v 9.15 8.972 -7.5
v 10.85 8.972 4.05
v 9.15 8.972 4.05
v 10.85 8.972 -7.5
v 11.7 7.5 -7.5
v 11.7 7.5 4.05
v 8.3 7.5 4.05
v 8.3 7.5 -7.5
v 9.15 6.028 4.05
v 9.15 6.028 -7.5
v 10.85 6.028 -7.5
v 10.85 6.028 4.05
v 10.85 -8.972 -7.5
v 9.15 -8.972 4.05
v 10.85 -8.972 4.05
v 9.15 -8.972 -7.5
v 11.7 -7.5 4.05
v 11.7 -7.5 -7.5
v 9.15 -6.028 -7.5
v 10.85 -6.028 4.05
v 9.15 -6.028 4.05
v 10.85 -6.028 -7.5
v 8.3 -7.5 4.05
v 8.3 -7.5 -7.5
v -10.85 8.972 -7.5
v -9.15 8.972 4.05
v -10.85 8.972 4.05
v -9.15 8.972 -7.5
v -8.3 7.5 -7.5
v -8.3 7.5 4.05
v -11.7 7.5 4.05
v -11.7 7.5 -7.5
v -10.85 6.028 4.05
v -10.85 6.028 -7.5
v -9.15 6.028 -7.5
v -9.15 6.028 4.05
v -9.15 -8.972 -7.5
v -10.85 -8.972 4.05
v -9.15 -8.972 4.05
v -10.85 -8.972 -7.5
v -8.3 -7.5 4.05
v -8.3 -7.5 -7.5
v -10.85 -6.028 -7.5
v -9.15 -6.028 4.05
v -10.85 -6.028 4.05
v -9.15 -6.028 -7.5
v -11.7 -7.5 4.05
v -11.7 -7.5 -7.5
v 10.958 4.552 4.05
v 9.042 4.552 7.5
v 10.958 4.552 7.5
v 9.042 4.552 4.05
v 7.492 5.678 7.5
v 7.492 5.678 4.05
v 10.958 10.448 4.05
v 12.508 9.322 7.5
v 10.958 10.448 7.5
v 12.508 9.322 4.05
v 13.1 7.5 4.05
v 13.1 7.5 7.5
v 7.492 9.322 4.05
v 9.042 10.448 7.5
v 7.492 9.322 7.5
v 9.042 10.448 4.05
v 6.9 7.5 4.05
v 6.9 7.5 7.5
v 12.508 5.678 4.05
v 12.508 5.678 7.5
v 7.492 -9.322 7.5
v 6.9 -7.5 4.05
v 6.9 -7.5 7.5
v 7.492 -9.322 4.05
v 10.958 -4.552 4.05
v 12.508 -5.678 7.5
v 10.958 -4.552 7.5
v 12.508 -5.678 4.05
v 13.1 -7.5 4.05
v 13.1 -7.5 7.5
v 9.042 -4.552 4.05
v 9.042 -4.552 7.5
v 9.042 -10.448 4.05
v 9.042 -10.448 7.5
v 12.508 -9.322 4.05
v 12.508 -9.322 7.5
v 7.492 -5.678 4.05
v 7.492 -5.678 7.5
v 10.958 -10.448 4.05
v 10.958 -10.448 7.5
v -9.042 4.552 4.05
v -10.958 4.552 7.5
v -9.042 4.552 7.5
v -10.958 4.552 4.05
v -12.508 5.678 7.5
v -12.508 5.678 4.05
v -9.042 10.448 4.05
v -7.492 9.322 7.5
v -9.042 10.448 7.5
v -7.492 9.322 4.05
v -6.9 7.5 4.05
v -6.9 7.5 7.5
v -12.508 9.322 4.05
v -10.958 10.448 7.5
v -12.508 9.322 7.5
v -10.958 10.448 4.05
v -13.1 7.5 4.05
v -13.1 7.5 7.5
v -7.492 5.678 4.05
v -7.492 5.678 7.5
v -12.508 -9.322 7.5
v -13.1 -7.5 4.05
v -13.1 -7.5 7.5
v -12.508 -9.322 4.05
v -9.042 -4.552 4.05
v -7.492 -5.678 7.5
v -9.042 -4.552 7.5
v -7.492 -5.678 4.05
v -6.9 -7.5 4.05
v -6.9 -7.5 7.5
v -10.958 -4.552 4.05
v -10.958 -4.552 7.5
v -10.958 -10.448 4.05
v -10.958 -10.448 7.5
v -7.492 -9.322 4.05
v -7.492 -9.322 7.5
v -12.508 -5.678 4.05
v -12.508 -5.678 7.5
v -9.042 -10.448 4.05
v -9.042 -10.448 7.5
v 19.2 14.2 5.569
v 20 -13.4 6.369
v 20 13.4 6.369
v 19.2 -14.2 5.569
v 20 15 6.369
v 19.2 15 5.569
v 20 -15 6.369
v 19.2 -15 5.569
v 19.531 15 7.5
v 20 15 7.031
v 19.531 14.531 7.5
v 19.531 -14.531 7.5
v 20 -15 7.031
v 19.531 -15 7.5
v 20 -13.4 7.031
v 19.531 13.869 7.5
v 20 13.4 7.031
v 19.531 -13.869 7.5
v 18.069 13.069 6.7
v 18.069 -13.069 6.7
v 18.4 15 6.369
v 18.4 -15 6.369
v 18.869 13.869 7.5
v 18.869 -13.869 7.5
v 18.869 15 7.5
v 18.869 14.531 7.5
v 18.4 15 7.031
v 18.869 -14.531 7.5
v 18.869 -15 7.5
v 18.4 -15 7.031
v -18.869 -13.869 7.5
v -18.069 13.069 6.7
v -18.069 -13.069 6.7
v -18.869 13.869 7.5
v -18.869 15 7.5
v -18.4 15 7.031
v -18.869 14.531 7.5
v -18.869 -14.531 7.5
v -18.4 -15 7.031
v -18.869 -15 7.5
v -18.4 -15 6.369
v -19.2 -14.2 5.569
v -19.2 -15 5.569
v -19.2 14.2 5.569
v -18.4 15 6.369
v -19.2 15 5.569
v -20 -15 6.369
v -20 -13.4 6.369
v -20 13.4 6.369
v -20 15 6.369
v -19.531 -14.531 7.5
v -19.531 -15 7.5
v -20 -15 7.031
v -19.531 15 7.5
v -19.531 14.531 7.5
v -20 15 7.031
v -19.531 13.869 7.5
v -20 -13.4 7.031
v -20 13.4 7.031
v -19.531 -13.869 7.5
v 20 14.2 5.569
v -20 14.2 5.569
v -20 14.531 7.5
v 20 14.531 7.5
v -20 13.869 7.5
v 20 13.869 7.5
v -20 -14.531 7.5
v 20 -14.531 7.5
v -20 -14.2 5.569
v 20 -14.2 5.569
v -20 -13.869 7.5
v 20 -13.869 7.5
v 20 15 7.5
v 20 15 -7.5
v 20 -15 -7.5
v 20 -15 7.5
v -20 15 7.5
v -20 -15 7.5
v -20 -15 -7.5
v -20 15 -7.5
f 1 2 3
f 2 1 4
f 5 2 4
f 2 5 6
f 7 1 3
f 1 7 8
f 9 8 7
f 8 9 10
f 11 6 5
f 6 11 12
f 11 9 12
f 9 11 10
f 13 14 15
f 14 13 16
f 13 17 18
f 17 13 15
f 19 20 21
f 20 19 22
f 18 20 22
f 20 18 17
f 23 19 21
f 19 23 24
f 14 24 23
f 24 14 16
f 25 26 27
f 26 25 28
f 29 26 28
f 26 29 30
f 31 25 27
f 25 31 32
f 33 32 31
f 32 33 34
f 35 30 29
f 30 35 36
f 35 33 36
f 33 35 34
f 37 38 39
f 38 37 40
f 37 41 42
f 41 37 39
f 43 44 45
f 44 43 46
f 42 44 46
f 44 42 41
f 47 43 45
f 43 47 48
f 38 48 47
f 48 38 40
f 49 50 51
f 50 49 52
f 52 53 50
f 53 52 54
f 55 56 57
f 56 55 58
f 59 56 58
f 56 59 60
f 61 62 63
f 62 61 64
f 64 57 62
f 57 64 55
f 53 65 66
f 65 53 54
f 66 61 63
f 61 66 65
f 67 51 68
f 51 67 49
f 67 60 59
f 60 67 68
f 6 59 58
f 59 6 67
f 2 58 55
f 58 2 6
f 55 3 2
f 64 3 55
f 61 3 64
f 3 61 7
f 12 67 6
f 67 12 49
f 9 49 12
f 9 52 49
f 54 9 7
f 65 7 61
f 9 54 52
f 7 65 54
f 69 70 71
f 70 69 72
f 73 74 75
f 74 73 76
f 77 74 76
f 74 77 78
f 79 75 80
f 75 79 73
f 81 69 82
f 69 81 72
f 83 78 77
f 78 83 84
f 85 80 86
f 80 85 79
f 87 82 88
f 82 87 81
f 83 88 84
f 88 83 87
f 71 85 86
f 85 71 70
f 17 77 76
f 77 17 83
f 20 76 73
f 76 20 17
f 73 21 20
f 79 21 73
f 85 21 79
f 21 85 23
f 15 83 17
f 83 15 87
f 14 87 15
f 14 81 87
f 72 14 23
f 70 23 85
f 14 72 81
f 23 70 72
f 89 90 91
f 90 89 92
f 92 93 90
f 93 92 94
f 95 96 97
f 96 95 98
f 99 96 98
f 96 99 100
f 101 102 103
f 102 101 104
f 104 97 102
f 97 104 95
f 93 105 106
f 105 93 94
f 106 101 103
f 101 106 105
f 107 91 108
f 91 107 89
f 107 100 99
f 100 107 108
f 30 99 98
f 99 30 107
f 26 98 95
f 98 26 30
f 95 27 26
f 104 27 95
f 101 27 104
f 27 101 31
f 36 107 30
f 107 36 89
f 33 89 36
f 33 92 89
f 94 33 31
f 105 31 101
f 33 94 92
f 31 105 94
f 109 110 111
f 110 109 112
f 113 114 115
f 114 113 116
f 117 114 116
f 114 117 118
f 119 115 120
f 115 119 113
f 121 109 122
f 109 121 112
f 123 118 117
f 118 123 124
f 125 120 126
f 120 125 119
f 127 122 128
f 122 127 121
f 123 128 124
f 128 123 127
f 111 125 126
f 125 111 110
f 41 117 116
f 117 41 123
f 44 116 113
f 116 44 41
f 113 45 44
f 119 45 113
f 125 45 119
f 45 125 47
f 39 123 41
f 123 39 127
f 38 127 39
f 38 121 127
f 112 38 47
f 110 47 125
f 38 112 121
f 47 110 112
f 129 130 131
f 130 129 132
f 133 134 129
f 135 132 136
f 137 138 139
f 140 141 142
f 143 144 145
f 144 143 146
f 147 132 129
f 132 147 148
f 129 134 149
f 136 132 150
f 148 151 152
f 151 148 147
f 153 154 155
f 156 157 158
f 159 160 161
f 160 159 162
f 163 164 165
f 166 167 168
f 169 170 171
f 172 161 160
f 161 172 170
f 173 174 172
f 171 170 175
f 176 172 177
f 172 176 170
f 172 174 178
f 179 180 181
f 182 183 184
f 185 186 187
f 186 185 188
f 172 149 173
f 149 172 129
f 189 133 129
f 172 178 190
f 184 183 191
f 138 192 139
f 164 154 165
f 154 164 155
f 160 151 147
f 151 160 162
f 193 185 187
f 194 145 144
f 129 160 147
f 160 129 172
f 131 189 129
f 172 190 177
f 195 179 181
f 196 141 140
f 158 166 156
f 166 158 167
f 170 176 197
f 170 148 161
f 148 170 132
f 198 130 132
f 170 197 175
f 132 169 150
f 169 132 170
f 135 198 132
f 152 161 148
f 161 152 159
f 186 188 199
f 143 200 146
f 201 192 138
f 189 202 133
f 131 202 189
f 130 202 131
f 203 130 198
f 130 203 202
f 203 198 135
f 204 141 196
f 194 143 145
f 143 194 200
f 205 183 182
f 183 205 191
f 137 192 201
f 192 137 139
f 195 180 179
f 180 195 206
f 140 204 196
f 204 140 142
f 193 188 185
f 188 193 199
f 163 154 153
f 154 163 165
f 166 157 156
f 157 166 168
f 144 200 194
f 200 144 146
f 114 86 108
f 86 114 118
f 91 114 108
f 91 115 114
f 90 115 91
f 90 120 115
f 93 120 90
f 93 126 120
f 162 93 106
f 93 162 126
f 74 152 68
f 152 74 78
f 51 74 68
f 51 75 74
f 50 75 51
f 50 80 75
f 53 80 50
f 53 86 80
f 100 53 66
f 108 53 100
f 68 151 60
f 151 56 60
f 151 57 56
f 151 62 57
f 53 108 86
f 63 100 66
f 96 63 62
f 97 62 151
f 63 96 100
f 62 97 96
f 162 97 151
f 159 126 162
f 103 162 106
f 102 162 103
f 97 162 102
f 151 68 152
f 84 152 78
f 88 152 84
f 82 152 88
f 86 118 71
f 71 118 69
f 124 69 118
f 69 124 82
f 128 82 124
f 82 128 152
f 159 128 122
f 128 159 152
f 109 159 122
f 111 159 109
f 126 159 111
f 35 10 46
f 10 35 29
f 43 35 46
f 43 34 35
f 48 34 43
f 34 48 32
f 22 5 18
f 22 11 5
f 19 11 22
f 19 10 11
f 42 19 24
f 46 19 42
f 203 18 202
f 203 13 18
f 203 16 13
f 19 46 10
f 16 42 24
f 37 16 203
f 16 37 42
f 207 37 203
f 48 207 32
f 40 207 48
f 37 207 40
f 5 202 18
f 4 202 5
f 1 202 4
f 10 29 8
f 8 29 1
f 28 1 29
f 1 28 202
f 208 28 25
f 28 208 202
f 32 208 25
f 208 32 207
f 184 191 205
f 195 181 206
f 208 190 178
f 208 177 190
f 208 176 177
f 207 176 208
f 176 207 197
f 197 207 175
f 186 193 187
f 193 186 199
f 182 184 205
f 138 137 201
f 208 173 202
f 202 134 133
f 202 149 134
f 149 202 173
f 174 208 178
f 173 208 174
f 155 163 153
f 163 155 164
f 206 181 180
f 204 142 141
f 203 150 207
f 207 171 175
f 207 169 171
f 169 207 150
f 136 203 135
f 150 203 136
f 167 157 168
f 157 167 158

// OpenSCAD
// Parameters
block_length = 40; //[20:80:1]
block_width = 30; //[15:60:1]
block_height = 15; //[8:30:1]
m3_clearance_diameter = 3.4; //[3:4.2:0.1]
hole_depth = 20; //[8:40:1]
use_through_holes = 1; //[0:1:1]
use_counterbore = 1; //[0:1:1]
counterbore_diameter = 6.2; //[5:10:0.1]
counterbore_depth = 3.2; //[1.5:6:0.1]
edge_chamfer = 0.8; //[0:2.5:0.1]
hole_z_fudge = 0.5; //[0.2:2:0.1]
mgn12h_pitch_x = 20; //[10:30:1]
mgn12h_pitch_y = 15; //[8:25:1]

// Base Shapes
module mounting_block_body() {
  translate([0, 0, 0])
    cube([block_length, block_width, block_height], center=true);
}

module edge_chamfer_tool_top_xpos() {
  translate([block_length/2 - edge_chamfer, 0, block_height/2 - edge_chamfer])
    rotate([0, 45, 0])
      cube([edge_chamfer*2, block_width+hole_z_fudge*2, edge_chamfer*2], center=true);
}

module edge_chamfer_tool_top_xneg() {
  translate([-block_length/2 + edge_chamfer, 0, block_height/2 - edge_chamfer])
    rotate([0, 45, 0])
      cube([edge_chamfer*2, block_width+hole_z_fudge*2, edge_chamfer*2], center=true);
}

module edge_chamfer_tool_top_ypos() {
  translate([0, block_width/2 - edge_chamfer, block_height/2 - edge_chamfer])
    rotate([45, 0, 0])
      cube([block_length+hole_z_fudge*2, edge_chamfer*2, edge_chamfer*2], center=true);
}

module edge_chamfer_tool_top_yneg() {
  translate([0, -block_width/2 + edge_chamfer, block_height/2 - edge_chamfer])
    rotate([45, 0, 0])
      cube([block_length+hole_z_fudge*2, edge_chamfer*2, edge_chamfer*2], center=true);
}

module m3_clearance_hole_cyl() {
  translate([0, 0, 0])
    cylinder(r=m3_clearance_diameter/2, h=block_height + hole_z_fudge*2, center=true);
}

module counterbore_cyl() {
  translate([0, 0, block_height/2 - counterbore_depth/2])
    cylinder(r=counterbore_diameter/2, h=counterbore_depth + hole_z_fudge, center=true);
}

// Operations
module m3_clearance_holes() {
  union() {
    translate([mgn12h_pitch_x/2, mgn12h_pitch_y/2, 0]) m3_clearance_hole_cyl();
    translate([mgn12h_pitch_x/2, -mgn12h_pitch_y/2, 0]) m3_clearance_hole_cyl();
    translate([-mgn12h_pitch_x/2, mgn12h_pitch_y/2, 0]) m3_clearance_hole_cyl();
    translate([-mgn12h_pitch_x/2, -mgn12h_pitch_y/2, 0]) m3_clearance_hole_cyl();
  }
}

module bolt_head_recesses() {
  union() {
    translate([mgn12h_pitch_x/2, mgn12h_pitch_y/2, 0]) counterbore_cyl();
    translate([mgn12h_pitch_x/2, -mgn12h_pitch_y/2, 0]) counterbore_cyl();
    translate([-mgn12h_pitch_x/2, mgn12h_pitch_y/2, 0]) counterbore_cyl();
    translate([-mgn12h_pitch_x/2, -mgn12h_pitch_y/2, 0]) counterbore_cyl();
  }
}

module edge_fillets_or_chamfers() {
  union() {
    edge_chamfer_tool_top_xpos();
    edge_chamfer_tool_top_xneg();
    edge_chamfer_tool_top_ypos();
    edge_chamfer_tool_top_yneg();
  }
}

// Final Output
difference() {
  mounting_block_body();
  m3_clearance_holes();
  if (use_counterbore) bolt_head_recesses();
  edge_fillets_or_chamfers();
}
